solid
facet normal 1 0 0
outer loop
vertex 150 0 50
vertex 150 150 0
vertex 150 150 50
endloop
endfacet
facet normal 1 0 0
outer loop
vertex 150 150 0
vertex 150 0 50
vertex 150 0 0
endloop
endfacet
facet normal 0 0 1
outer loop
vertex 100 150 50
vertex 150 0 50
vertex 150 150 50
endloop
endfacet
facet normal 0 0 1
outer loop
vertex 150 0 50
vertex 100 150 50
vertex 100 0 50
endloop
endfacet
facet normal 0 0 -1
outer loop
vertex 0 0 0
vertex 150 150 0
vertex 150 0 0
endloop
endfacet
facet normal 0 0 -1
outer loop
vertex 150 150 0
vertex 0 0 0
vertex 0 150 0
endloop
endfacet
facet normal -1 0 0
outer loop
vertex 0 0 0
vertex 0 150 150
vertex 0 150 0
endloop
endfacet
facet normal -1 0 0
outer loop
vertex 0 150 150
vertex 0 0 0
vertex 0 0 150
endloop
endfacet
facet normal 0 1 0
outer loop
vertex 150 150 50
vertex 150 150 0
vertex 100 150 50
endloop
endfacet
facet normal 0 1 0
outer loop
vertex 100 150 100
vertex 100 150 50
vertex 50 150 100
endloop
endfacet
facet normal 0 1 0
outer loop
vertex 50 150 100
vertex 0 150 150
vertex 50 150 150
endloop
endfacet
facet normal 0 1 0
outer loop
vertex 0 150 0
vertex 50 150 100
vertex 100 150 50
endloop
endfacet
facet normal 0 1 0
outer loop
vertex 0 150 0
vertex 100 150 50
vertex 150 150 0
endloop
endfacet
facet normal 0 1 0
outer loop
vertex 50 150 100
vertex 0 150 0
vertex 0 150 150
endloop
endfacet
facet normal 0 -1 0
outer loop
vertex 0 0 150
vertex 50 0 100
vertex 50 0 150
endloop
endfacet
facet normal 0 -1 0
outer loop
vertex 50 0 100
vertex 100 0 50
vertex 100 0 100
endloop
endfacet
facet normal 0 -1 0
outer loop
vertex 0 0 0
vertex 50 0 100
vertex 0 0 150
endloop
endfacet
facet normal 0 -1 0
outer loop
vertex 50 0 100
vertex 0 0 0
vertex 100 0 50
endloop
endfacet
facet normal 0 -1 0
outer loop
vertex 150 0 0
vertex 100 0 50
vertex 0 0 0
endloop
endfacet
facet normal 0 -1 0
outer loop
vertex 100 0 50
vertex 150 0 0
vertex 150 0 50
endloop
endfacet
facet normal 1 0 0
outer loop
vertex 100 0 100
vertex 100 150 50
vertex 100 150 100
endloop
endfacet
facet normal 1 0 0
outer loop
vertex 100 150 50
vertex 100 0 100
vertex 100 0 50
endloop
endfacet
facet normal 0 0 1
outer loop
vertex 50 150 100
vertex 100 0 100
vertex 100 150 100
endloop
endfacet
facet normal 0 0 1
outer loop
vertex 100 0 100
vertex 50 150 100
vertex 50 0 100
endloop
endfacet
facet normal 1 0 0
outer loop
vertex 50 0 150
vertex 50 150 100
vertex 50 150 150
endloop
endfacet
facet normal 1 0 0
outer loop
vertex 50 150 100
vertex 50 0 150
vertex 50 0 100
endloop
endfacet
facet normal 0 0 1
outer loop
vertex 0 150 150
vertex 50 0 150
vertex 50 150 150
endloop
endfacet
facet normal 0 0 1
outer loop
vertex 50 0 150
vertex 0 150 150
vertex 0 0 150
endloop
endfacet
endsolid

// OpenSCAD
//Office Steps
//by: Brett Mattas
//date: March 22, 2019
//units: mm


//Description:
// Office steps without back or bottom

/////////////////////////////////////////////
/////////  PARAMETERS ///////////////////////
/////////////////////////////////////////////

//Global Parameters
$fn = 50; //Roundness parameter
// Arbitrary small number to avoid coincident faces
EPS = 0.01; 

L = 150; //Length
W = 150; //Width
H = 150; //Height
nSteps = 3; //Number of steps
t = 10; // Minimum thickness




/////////////////////////////////////////////
/////////  RENDERS //////////////////////////
/////////////////////////////////////////////

//Driver
Steps();




/////////////////////////////////////////////
/////////  FUNCTIONS ////////////////////////
/////////////////////////////////////////////

//Spherical Coordinates
function radius(x, y, z) = pow(pow(x,2)+pow(y,2)+pow(z,2),0.5);

/////////////////////////////////////////////
/////////  MODULES //////////////////////////
/////////////////////////////////////////////

module Steps()
{
    difference(){
        //Elements added
        union(){
            
            for (istep = [0:nSteps-1])
            {
                cube(size = [
                    (nSteps-istep)/nSteps*L,
                    W,
                    (istep+1)/nSteps*H
                ], center = false);
            }
            
        }
        
        //Elements removed
        *union(){
            translate([L-EPS, t, -EPS])
                rotate([90, 0, 180])
                linear_extrude(
                        height=W-2*t,
                        center=false,
                        convexity=10
                        )
                CavityShape();
                    
        }
    }
}


module CavityShape()
{
    theta = atan(H/L);
    x1 = t/sin(theta);
    y1 = t/cos(theta);
    difference(){
        //Elements added
        union(){
        
            translate([0, 0, 0])
                polygon(points = [
                    [x1, 0],
                    [L, H-y1],
                    [L, 0]
                ]);
        }
        
        //Elements removed
        union(){
            
        }
    }
}

module TemplateModule()
{
    difference(){
        //Elements added
        union(){
        
            
        }
        
        //Elements removed
        union(){
            
        }
    }
}
